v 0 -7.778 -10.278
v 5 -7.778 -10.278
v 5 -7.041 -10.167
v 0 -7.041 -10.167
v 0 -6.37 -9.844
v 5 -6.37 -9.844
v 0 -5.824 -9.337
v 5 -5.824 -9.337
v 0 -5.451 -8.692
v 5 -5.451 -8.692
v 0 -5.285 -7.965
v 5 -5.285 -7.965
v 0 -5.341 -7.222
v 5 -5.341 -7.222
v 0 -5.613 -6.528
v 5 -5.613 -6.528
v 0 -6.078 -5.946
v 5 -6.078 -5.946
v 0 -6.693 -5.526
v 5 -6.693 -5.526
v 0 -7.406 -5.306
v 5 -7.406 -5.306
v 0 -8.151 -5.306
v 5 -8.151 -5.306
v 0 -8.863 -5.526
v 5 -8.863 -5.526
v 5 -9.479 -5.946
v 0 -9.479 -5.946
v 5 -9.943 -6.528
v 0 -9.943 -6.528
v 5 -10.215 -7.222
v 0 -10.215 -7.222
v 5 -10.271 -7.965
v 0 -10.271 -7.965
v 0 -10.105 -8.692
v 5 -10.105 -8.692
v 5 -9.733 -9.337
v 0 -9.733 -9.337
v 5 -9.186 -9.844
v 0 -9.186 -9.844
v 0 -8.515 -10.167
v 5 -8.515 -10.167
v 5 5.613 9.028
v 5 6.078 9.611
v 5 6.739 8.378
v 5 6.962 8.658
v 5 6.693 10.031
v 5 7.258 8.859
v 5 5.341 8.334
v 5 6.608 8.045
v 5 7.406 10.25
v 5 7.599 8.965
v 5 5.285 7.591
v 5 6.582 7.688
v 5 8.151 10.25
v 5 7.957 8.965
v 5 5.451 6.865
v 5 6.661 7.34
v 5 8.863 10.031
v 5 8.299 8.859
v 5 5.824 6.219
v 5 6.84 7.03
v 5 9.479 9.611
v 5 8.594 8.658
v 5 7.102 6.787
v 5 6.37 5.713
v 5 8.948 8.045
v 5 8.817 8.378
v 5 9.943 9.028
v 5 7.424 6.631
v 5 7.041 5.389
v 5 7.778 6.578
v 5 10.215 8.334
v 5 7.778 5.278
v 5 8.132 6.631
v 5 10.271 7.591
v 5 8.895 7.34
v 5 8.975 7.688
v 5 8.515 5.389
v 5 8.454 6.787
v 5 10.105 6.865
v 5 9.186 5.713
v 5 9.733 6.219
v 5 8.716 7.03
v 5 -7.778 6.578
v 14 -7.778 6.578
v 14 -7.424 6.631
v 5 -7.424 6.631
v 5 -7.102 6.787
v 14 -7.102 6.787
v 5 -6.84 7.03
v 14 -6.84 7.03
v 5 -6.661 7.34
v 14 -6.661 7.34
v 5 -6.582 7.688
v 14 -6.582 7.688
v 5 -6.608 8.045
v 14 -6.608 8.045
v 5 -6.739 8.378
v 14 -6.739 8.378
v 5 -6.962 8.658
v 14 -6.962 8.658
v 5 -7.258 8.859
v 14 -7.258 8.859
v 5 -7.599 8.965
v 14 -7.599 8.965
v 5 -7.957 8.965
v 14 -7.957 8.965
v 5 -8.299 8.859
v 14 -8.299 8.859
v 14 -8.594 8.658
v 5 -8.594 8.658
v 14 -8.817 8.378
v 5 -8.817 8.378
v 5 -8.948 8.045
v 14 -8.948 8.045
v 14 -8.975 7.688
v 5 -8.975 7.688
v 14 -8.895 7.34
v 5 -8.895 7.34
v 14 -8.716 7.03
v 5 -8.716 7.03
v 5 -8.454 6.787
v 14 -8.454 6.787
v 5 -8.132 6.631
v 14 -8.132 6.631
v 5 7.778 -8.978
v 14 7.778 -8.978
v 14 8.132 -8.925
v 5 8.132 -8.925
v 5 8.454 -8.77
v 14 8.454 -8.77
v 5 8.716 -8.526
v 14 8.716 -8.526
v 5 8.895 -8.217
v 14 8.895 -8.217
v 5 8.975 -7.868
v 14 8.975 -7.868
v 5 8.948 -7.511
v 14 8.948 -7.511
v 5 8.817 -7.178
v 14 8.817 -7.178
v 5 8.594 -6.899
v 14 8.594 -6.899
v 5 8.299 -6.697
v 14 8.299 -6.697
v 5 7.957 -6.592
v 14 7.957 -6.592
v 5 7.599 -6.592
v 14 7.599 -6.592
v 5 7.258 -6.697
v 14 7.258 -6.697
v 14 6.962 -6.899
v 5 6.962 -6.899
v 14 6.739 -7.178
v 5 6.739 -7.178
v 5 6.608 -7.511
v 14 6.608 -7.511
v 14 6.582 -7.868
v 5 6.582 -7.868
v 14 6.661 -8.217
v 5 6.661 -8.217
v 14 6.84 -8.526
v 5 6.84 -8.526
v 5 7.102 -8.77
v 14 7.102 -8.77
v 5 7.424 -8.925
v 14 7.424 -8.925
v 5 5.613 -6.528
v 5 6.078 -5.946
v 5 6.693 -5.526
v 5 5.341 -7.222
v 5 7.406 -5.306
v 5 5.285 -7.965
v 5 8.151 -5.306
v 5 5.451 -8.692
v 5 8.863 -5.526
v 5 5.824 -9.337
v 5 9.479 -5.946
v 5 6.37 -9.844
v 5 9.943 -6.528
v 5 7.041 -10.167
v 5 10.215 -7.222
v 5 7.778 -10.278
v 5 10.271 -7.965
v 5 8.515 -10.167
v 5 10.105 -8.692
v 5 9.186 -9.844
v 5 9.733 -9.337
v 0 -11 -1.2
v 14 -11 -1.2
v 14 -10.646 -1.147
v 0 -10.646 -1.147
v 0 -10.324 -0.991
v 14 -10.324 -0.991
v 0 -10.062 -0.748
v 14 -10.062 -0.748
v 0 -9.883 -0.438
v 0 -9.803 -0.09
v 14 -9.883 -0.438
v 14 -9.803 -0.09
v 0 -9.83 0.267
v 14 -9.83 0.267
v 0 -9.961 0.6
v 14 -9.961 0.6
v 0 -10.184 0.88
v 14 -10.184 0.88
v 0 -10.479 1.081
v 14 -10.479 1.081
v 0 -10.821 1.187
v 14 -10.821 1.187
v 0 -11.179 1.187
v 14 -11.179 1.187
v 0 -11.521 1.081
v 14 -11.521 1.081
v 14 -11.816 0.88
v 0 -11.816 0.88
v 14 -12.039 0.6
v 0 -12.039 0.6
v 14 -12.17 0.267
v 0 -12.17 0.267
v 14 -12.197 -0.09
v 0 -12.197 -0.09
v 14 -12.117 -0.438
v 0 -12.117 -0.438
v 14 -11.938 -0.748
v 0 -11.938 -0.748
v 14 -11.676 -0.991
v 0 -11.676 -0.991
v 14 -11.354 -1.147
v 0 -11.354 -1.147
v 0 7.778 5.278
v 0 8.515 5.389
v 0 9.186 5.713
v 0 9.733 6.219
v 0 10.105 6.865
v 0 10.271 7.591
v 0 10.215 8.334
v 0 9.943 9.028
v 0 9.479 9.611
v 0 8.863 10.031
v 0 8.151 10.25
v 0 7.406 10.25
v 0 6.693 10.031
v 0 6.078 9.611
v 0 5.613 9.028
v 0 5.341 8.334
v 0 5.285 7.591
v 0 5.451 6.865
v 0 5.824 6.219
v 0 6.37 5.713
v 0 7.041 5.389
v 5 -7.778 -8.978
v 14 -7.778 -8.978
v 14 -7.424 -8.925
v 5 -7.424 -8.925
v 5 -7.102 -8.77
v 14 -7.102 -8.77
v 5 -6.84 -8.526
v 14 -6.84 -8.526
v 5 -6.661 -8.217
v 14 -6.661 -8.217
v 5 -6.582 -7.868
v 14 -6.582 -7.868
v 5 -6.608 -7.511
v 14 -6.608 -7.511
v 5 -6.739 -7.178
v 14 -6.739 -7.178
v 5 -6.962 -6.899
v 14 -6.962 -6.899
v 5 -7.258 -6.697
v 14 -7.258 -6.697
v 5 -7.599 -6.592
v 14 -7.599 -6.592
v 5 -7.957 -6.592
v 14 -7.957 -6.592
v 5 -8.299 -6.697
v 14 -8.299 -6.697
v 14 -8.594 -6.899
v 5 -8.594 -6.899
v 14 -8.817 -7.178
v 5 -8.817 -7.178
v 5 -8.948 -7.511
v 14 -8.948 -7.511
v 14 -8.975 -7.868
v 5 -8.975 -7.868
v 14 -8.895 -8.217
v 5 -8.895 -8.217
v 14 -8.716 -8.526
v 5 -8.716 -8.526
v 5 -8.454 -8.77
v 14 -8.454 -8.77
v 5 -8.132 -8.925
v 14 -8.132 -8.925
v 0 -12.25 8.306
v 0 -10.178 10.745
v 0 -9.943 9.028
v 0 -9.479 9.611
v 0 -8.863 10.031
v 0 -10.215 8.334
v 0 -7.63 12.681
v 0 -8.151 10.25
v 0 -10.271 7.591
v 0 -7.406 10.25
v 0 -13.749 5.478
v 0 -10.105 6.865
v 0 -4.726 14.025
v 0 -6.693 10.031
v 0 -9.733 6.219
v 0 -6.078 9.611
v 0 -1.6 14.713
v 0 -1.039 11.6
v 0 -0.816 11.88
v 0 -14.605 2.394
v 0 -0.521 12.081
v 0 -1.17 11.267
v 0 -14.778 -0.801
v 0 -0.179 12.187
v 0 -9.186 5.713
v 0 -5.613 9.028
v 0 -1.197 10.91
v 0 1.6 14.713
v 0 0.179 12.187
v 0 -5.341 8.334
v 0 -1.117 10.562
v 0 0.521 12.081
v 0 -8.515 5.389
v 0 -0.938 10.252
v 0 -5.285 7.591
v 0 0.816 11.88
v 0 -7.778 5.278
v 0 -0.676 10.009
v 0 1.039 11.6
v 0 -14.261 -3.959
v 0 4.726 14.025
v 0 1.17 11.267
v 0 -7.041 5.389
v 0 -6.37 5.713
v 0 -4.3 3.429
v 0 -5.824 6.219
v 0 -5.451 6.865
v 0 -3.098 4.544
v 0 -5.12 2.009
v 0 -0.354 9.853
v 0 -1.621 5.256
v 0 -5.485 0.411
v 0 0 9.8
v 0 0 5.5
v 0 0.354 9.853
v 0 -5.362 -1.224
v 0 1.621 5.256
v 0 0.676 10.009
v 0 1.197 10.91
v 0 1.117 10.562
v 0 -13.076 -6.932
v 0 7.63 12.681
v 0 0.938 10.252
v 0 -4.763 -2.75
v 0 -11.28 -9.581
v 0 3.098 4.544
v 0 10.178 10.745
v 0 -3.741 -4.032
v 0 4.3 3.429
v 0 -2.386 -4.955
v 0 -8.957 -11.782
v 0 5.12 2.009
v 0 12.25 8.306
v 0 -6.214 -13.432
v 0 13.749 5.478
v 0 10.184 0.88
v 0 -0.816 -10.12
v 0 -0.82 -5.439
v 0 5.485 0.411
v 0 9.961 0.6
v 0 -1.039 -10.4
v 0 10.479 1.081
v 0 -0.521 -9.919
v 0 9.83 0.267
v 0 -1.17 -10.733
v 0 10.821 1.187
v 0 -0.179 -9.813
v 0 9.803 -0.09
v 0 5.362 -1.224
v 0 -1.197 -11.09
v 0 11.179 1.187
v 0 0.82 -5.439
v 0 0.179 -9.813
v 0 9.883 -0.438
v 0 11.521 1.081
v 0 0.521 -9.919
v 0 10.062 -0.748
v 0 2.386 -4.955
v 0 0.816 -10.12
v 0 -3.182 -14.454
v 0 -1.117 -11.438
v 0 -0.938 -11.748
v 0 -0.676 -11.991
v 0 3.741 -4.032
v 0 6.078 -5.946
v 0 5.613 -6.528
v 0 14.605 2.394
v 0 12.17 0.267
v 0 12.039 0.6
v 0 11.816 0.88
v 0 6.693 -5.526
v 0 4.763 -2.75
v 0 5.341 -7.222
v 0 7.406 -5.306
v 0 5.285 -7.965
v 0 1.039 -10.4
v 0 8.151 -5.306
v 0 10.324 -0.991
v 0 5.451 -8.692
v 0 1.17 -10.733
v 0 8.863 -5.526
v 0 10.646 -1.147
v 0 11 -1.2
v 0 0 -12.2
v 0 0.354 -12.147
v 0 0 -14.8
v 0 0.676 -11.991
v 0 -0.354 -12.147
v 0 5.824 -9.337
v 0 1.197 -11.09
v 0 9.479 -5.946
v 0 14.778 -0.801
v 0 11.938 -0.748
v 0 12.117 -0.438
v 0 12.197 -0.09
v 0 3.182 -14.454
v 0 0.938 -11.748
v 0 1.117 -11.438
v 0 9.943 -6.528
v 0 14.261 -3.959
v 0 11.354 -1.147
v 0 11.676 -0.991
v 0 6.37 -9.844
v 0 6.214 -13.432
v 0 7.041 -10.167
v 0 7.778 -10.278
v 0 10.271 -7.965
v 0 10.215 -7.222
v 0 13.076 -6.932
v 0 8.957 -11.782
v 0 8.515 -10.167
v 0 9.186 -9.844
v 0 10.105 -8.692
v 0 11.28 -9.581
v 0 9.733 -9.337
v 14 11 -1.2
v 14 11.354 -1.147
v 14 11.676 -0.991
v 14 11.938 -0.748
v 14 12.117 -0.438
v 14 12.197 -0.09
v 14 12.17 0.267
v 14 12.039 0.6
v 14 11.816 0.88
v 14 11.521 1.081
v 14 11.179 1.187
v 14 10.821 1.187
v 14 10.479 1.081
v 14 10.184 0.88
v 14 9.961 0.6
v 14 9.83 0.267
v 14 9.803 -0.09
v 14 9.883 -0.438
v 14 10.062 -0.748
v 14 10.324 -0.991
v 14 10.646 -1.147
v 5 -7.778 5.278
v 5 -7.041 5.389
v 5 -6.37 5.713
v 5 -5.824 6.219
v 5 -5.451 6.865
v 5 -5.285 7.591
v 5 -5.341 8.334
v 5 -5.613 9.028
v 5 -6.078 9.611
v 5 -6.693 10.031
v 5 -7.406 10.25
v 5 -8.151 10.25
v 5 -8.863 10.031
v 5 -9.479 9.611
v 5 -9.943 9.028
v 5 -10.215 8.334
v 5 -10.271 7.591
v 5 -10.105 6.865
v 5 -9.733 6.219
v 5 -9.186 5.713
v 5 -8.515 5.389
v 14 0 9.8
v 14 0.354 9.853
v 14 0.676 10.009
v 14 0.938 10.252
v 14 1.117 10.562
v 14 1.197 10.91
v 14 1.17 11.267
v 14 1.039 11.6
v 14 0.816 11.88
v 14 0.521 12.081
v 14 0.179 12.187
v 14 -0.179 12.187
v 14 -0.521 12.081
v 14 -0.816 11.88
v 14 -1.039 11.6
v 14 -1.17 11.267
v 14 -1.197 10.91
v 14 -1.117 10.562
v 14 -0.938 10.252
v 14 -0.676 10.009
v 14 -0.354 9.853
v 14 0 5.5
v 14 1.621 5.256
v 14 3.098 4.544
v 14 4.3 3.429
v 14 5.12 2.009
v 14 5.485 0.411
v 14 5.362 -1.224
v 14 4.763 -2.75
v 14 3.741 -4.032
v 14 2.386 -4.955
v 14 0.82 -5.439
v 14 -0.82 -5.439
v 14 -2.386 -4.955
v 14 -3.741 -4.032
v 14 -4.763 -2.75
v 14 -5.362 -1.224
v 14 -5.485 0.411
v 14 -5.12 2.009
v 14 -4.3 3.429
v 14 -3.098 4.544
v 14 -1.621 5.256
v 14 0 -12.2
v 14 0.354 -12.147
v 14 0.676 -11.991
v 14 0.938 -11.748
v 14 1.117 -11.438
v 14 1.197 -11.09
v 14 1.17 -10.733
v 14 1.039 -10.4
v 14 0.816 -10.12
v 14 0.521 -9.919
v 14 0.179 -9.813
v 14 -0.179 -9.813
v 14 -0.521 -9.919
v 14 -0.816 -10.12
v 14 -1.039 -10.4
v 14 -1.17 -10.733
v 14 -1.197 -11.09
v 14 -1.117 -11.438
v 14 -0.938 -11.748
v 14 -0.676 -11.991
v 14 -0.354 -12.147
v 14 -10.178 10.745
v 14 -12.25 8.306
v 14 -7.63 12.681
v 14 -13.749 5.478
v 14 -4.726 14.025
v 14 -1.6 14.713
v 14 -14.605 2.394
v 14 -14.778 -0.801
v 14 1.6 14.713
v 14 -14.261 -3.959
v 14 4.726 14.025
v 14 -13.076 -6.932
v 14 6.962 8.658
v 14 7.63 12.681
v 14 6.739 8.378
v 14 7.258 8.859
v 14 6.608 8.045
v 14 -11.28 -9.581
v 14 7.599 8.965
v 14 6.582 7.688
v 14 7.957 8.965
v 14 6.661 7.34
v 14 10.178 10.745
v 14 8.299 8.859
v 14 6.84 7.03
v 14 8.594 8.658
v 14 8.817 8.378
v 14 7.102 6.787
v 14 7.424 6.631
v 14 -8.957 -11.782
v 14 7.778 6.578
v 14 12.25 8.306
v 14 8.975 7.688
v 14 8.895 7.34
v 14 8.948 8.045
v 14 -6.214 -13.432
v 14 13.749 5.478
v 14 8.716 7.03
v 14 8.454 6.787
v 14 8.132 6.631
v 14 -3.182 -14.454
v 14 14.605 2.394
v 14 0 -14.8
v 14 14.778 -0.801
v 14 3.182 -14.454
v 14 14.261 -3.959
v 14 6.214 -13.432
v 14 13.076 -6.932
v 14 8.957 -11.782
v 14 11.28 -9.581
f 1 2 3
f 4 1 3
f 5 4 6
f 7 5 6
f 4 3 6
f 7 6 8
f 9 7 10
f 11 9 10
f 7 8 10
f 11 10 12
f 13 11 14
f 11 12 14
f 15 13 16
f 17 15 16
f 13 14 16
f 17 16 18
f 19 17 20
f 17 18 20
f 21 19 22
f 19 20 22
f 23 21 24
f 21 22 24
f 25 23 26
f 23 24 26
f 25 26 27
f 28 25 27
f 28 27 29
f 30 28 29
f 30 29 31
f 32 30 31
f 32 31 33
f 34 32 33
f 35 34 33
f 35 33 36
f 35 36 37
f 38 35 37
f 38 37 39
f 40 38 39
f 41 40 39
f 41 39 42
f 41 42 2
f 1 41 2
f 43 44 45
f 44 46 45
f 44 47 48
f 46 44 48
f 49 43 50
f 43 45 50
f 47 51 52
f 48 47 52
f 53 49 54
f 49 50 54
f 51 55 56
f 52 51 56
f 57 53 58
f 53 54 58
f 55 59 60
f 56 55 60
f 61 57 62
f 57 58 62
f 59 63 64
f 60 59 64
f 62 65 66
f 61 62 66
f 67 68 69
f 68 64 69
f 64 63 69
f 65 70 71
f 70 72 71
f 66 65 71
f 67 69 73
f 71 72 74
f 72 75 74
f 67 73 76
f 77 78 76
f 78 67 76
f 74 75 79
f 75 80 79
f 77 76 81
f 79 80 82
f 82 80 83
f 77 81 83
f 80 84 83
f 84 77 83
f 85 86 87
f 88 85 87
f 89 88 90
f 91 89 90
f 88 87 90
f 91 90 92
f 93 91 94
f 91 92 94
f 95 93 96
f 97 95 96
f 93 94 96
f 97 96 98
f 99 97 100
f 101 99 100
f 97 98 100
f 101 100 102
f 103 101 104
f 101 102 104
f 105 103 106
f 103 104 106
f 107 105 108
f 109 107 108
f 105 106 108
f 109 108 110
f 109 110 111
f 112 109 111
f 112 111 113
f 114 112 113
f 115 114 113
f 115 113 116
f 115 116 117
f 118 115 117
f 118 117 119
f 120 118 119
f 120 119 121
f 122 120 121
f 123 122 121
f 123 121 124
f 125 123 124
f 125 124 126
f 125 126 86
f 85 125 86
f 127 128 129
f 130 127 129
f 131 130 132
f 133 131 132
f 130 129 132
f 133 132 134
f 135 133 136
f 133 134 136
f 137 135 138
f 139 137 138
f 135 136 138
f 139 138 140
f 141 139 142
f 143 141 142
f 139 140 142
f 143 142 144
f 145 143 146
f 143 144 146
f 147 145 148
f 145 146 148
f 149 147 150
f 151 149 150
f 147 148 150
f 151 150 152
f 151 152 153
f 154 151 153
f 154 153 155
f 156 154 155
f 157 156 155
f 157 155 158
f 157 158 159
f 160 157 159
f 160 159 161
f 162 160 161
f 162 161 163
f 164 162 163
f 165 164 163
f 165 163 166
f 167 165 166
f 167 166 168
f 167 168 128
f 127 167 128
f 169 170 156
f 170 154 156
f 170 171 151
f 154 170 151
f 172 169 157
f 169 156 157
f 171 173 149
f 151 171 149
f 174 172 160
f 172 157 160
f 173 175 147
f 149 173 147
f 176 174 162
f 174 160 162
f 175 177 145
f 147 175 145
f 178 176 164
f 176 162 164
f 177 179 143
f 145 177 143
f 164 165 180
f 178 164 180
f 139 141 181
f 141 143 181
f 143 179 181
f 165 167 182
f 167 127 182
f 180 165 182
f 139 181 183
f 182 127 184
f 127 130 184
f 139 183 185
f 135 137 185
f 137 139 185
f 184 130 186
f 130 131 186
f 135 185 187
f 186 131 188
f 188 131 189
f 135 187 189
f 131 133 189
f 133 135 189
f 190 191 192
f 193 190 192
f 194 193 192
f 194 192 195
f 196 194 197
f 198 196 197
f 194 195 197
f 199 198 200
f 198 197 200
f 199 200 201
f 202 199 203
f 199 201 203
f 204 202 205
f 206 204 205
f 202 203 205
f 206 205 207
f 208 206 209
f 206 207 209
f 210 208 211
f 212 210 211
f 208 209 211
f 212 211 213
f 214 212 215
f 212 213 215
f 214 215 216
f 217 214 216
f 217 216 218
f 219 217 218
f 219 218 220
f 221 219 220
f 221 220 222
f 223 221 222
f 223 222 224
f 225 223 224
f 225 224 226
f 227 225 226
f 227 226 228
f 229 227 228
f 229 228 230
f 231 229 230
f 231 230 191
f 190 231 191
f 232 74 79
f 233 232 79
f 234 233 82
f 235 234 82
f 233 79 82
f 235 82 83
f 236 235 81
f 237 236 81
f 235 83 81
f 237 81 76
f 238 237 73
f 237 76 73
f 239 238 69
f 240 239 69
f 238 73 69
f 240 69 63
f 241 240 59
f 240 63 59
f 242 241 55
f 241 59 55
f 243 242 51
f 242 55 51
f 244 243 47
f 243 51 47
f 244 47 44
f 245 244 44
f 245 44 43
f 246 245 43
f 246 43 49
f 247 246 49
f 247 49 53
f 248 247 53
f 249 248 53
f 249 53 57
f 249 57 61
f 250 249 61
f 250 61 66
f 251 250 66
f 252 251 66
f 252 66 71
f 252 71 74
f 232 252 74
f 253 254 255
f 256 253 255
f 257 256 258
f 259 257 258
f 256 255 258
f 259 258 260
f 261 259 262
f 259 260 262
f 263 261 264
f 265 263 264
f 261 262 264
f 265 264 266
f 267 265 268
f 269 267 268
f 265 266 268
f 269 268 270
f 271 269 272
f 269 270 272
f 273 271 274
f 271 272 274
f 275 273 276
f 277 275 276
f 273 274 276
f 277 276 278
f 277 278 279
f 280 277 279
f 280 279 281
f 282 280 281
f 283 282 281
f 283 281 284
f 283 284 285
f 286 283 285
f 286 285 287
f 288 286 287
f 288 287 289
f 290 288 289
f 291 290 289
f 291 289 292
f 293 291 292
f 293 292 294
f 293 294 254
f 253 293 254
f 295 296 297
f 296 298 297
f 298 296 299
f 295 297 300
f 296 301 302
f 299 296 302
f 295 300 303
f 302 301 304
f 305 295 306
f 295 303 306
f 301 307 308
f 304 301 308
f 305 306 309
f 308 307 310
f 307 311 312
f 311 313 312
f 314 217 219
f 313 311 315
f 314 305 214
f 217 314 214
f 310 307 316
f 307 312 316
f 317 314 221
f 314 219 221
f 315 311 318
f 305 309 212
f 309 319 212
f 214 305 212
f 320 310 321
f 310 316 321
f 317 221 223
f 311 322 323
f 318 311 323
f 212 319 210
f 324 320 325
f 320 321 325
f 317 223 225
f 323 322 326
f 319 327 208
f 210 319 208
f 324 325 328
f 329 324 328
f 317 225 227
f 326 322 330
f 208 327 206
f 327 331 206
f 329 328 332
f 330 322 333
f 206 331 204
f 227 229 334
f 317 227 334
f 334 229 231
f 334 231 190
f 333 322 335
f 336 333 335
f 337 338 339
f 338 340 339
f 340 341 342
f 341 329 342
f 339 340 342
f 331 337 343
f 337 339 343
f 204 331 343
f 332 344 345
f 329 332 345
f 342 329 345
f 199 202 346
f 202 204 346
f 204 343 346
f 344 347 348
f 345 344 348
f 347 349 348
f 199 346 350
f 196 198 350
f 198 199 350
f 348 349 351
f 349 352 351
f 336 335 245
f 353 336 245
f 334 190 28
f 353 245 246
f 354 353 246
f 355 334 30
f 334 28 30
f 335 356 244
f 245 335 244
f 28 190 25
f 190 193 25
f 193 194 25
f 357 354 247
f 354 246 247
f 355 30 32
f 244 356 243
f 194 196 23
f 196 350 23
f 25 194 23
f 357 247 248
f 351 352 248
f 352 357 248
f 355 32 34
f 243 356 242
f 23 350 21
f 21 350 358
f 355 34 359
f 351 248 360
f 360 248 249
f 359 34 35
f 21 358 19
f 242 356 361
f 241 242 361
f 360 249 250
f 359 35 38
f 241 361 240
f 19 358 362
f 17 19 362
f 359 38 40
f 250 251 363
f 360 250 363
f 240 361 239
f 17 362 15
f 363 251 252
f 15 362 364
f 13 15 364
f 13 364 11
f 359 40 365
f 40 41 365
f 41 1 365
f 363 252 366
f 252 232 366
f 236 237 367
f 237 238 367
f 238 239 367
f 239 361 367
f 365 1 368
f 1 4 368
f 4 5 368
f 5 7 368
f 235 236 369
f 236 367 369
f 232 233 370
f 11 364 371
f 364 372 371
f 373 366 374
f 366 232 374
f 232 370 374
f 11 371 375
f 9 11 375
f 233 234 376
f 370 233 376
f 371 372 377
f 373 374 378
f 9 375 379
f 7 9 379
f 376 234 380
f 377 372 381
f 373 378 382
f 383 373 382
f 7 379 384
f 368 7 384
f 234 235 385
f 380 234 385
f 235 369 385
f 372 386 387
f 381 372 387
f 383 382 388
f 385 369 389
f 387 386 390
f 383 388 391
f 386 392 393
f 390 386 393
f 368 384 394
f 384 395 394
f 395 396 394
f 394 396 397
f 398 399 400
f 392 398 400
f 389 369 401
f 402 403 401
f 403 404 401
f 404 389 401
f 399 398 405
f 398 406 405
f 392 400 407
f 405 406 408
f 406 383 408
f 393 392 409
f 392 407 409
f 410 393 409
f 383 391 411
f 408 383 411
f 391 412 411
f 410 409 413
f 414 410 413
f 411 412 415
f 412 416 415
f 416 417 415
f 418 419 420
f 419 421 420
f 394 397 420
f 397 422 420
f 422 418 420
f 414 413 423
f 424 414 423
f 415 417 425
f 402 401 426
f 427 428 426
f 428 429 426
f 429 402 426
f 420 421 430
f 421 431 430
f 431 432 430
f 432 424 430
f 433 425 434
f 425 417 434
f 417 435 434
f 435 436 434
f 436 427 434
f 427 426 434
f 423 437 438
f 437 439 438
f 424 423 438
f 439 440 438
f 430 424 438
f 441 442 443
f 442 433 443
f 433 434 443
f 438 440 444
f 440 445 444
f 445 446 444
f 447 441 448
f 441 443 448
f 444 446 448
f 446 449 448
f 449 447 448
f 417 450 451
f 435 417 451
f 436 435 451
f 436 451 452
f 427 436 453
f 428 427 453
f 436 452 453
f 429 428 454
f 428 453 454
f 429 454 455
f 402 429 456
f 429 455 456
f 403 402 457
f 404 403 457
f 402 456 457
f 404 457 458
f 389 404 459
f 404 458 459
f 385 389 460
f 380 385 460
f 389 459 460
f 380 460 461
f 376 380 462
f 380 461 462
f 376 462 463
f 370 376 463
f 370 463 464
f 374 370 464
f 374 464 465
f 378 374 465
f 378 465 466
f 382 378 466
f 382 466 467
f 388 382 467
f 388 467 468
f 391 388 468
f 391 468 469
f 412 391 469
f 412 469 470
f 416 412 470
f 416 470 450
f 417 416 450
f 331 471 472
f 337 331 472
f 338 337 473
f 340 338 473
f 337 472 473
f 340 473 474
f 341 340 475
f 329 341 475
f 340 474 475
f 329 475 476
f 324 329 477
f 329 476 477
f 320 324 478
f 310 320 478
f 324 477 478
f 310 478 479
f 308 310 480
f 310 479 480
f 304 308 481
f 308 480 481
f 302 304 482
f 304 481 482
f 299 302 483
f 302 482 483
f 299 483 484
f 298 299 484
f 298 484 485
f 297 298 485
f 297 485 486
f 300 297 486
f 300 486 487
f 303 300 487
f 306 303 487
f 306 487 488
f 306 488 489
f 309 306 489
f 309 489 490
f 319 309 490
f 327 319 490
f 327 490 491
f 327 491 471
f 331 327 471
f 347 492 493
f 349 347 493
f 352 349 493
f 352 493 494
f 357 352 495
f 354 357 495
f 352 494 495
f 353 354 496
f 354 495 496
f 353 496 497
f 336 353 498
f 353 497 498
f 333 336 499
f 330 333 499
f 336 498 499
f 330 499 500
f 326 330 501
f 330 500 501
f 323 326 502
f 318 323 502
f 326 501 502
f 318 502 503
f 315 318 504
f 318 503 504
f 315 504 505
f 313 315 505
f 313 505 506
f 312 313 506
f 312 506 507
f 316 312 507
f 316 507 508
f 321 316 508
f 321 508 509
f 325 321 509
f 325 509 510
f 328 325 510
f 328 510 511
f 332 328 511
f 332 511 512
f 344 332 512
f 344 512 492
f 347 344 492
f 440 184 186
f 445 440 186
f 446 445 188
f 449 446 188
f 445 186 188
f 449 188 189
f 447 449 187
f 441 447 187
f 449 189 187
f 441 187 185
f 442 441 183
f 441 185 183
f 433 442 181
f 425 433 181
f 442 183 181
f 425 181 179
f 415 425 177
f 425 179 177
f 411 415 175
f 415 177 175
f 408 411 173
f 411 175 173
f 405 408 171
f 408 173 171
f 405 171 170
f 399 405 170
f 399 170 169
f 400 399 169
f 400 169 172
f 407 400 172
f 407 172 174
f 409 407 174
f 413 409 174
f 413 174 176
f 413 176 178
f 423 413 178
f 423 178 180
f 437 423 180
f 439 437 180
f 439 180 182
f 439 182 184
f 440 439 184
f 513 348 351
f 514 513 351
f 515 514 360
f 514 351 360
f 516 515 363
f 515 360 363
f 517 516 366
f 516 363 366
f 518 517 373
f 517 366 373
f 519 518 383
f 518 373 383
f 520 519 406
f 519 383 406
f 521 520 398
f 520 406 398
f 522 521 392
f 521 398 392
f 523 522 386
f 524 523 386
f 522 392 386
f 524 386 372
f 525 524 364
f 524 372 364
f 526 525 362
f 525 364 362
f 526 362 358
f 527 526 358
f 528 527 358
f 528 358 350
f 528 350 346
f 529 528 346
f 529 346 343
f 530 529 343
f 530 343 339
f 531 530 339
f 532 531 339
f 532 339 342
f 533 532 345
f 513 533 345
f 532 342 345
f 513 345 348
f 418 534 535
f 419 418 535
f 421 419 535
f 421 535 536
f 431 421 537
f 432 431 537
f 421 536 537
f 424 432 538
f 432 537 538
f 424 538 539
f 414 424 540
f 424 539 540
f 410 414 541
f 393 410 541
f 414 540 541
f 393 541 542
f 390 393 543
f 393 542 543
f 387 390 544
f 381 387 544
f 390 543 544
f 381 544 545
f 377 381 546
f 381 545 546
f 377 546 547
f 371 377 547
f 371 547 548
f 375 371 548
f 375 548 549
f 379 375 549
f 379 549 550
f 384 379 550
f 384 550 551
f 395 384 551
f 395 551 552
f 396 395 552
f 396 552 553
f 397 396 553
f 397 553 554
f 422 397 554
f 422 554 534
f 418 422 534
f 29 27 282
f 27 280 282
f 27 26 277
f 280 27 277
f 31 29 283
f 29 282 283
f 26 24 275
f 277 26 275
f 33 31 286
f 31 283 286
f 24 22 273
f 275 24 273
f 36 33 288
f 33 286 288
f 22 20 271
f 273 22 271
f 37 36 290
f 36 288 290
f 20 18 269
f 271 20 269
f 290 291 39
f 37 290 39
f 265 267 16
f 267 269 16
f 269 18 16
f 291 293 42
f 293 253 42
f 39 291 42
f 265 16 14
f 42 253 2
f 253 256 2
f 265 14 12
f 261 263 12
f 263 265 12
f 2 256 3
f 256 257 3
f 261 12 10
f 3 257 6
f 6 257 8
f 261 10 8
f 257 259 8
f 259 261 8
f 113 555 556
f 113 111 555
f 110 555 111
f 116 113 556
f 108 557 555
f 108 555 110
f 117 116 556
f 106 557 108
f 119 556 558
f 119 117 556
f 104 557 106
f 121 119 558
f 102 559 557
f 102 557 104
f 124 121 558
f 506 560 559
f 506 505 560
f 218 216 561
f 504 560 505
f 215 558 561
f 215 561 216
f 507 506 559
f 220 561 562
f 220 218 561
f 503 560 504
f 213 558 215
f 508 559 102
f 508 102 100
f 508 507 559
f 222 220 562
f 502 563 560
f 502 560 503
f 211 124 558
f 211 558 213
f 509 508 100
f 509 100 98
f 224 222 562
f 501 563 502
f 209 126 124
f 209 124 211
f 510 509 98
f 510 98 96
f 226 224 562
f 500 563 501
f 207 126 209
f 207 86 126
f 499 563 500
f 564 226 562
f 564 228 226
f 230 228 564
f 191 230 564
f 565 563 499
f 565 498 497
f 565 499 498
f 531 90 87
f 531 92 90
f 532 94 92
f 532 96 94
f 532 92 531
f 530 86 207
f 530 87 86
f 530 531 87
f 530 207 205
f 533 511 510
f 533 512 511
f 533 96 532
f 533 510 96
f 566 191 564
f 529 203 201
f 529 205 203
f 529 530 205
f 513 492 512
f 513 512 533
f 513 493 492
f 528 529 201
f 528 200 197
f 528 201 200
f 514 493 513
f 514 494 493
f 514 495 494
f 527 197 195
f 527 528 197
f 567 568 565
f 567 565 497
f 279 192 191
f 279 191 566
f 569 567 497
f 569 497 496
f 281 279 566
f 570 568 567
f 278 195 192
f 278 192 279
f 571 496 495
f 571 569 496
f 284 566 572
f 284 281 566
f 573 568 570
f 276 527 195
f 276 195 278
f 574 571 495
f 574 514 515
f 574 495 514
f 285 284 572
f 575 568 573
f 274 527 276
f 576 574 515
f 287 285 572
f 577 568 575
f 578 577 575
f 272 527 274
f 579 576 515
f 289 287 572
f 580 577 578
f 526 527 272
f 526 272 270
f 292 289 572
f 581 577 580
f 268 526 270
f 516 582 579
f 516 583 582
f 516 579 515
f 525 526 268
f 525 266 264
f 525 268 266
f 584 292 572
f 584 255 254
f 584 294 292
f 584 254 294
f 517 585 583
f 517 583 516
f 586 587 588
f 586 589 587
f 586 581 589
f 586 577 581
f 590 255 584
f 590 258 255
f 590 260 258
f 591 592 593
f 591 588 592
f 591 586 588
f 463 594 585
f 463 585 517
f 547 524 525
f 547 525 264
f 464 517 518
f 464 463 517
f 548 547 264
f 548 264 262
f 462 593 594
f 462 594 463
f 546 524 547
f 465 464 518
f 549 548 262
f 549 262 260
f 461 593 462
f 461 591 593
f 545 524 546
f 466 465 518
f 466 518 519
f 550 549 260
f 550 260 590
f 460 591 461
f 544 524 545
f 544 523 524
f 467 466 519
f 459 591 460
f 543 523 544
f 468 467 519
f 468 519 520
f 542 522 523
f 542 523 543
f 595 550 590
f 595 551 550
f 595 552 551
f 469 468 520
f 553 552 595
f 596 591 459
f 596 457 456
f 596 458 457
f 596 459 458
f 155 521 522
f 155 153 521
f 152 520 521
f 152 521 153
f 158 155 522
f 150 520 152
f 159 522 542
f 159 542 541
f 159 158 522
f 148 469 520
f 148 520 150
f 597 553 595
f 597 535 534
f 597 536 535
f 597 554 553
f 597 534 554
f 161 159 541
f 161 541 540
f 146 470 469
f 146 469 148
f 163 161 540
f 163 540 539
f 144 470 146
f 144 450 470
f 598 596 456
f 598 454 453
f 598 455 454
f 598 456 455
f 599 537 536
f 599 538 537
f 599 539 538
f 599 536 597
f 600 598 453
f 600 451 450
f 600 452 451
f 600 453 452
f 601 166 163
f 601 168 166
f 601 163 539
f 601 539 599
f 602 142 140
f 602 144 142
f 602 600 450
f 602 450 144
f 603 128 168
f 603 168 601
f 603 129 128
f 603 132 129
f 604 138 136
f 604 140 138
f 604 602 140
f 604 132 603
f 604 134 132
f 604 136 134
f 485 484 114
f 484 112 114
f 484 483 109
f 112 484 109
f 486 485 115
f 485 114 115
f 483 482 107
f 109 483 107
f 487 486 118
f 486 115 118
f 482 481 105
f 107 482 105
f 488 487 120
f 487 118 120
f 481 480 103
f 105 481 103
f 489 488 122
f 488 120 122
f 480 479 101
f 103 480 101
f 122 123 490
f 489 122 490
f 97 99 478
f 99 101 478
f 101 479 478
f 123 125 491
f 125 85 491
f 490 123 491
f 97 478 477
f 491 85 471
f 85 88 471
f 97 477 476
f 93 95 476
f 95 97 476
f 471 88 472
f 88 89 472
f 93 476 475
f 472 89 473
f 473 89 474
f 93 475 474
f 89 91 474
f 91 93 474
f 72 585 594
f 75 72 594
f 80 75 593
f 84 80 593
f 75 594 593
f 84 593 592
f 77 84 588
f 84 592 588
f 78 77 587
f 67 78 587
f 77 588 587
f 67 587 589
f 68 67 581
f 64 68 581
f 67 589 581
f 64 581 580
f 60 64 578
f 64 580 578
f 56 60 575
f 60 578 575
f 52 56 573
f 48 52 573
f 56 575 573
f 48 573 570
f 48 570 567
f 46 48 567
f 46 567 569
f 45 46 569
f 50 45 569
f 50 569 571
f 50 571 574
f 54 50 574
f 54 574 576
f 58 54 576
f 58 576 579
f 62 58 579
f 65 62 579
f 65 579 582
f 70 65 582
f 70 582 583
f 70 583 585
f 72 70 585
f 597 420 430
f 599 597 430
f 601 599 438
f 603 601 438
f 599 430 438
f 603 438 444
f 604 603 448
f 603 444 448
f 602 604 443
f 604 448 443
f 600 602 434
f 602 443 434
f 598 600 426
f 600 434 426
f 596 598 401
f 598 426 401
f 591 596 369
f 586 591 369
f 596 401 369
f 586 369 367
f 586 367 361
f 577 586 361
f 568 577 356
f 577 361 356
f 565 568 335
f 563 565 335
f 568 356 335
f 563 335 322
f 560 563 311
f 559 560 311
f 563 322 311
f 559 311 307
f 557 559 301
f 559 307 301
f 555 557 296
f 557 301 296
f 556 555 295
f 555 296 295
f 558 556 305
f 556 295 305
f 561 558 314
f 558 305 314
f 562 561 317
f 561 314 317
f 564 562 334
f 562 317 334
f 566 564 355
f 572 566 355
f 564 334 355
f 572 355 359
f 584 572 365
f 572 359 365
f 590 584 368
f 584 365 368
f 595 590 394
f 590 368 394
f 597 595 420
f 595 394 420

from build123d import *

# Parameters (mm, degrees)
SKETCH1_R               = 14.8
BOSS_EXTRUDE1_DEPTH     = 14
SKETCH2_R               = 1.2
CUT_EXTRUDE1_DEPTH      = 1
CUT_EXTRUDE1_DEPTH_BACK = 15
SKETCH3_R               = 5.5
CUT_EXTRUDE2_DEPTH      = 14
CUT_EXTRUDE3_START      = -9
SKETCH5_R               = 2.5
CUT_EXTRUDE3_DEPTH      = 6


with BuildPart() as part:
    # Sketch1 → Boss-Extrude1 (new body)
    with BuildSketch(Plane(origin=(0, 0, 0), x_dir=(0, 0, -1), z_dir=(1, 0, 0))):
        Circle(SKETCH1_R)
    extrude(amount=BOSS_EXTRUDE1_DEPTH)

    # Sketch2 → Cut-Extrude1 (cut, two sides)
    with BuildSketch(Plane(origin=(14, 0, 0), x_dir=(0, 0, -1), z_dir=(1, 0, 0))) as cut_extrude1_sk:
        with Locations((0, 11)):
            Circle(SKETCH2_R)
        with Locations((7.778174593, 7.778174593)):
            Circle(SKETCH2_R)
        with Locations((11, 0)):
            Circle(SKETCH2_R)
        with Locations((7.778174593, -7.778174593)):
            Circle(SKETCH2_R)
        with Locations((0, -11)):
            Circle(SKETCH2_R)
        with Locations((-7.778174593, -7.778174593)):
            Circle(SKETCH2_R)
        with Locations((-11, 0)):
            Circle(SKETCH2_R)
        with Locations((-7.778174593, 7.778174593)):
            Circle(SKETCH2_R)
    extrude(amount=CUT_EXTRUDE1_DEPTH, mode=Mode.SUBTRACT)
    extrude(cut_extrude1_sk.sketch, amount=-CUT_EXTRUDE1_DEPTH_BACK, mode=Mode.SUBTRACT)

    # Sketch3 → Cut-Extrude2 (cut)
    with BuildSketch(Plane.ZY):
        Circle(SKETCH3_R)
    extrude(amount=-CUT_EXTRUDE2_DEPTH, mode=Mode.SUBTRACT)

    # Sketch5 → Cut-Extrude3 (cut, through all)
    with BuildSketch(Plane(origin=(14, 0, 0), x_dir=(0, 0, -1), z_dir=(1, 0, 0)).offset(CUT_EXTRUDE3_START)):
        with Locations((7.778174593, 7.778174593)):
            Circle(SKETCH5_R)
        with Locations((-7.778174593, -7.778174593)):
            Circle(SKETCH5_R)
        with Locations((7.778174593, -7.778174593)):
            Circle(SKETCH5_R)
        with Locations((-7.778174593, 7.778174593)):
            Circle(SKETCH5_R)
    extrude(amount=-CUT_EXTRUDE3_DEPTH, mode=Mode.SUBTRACT)


solid = part.part
